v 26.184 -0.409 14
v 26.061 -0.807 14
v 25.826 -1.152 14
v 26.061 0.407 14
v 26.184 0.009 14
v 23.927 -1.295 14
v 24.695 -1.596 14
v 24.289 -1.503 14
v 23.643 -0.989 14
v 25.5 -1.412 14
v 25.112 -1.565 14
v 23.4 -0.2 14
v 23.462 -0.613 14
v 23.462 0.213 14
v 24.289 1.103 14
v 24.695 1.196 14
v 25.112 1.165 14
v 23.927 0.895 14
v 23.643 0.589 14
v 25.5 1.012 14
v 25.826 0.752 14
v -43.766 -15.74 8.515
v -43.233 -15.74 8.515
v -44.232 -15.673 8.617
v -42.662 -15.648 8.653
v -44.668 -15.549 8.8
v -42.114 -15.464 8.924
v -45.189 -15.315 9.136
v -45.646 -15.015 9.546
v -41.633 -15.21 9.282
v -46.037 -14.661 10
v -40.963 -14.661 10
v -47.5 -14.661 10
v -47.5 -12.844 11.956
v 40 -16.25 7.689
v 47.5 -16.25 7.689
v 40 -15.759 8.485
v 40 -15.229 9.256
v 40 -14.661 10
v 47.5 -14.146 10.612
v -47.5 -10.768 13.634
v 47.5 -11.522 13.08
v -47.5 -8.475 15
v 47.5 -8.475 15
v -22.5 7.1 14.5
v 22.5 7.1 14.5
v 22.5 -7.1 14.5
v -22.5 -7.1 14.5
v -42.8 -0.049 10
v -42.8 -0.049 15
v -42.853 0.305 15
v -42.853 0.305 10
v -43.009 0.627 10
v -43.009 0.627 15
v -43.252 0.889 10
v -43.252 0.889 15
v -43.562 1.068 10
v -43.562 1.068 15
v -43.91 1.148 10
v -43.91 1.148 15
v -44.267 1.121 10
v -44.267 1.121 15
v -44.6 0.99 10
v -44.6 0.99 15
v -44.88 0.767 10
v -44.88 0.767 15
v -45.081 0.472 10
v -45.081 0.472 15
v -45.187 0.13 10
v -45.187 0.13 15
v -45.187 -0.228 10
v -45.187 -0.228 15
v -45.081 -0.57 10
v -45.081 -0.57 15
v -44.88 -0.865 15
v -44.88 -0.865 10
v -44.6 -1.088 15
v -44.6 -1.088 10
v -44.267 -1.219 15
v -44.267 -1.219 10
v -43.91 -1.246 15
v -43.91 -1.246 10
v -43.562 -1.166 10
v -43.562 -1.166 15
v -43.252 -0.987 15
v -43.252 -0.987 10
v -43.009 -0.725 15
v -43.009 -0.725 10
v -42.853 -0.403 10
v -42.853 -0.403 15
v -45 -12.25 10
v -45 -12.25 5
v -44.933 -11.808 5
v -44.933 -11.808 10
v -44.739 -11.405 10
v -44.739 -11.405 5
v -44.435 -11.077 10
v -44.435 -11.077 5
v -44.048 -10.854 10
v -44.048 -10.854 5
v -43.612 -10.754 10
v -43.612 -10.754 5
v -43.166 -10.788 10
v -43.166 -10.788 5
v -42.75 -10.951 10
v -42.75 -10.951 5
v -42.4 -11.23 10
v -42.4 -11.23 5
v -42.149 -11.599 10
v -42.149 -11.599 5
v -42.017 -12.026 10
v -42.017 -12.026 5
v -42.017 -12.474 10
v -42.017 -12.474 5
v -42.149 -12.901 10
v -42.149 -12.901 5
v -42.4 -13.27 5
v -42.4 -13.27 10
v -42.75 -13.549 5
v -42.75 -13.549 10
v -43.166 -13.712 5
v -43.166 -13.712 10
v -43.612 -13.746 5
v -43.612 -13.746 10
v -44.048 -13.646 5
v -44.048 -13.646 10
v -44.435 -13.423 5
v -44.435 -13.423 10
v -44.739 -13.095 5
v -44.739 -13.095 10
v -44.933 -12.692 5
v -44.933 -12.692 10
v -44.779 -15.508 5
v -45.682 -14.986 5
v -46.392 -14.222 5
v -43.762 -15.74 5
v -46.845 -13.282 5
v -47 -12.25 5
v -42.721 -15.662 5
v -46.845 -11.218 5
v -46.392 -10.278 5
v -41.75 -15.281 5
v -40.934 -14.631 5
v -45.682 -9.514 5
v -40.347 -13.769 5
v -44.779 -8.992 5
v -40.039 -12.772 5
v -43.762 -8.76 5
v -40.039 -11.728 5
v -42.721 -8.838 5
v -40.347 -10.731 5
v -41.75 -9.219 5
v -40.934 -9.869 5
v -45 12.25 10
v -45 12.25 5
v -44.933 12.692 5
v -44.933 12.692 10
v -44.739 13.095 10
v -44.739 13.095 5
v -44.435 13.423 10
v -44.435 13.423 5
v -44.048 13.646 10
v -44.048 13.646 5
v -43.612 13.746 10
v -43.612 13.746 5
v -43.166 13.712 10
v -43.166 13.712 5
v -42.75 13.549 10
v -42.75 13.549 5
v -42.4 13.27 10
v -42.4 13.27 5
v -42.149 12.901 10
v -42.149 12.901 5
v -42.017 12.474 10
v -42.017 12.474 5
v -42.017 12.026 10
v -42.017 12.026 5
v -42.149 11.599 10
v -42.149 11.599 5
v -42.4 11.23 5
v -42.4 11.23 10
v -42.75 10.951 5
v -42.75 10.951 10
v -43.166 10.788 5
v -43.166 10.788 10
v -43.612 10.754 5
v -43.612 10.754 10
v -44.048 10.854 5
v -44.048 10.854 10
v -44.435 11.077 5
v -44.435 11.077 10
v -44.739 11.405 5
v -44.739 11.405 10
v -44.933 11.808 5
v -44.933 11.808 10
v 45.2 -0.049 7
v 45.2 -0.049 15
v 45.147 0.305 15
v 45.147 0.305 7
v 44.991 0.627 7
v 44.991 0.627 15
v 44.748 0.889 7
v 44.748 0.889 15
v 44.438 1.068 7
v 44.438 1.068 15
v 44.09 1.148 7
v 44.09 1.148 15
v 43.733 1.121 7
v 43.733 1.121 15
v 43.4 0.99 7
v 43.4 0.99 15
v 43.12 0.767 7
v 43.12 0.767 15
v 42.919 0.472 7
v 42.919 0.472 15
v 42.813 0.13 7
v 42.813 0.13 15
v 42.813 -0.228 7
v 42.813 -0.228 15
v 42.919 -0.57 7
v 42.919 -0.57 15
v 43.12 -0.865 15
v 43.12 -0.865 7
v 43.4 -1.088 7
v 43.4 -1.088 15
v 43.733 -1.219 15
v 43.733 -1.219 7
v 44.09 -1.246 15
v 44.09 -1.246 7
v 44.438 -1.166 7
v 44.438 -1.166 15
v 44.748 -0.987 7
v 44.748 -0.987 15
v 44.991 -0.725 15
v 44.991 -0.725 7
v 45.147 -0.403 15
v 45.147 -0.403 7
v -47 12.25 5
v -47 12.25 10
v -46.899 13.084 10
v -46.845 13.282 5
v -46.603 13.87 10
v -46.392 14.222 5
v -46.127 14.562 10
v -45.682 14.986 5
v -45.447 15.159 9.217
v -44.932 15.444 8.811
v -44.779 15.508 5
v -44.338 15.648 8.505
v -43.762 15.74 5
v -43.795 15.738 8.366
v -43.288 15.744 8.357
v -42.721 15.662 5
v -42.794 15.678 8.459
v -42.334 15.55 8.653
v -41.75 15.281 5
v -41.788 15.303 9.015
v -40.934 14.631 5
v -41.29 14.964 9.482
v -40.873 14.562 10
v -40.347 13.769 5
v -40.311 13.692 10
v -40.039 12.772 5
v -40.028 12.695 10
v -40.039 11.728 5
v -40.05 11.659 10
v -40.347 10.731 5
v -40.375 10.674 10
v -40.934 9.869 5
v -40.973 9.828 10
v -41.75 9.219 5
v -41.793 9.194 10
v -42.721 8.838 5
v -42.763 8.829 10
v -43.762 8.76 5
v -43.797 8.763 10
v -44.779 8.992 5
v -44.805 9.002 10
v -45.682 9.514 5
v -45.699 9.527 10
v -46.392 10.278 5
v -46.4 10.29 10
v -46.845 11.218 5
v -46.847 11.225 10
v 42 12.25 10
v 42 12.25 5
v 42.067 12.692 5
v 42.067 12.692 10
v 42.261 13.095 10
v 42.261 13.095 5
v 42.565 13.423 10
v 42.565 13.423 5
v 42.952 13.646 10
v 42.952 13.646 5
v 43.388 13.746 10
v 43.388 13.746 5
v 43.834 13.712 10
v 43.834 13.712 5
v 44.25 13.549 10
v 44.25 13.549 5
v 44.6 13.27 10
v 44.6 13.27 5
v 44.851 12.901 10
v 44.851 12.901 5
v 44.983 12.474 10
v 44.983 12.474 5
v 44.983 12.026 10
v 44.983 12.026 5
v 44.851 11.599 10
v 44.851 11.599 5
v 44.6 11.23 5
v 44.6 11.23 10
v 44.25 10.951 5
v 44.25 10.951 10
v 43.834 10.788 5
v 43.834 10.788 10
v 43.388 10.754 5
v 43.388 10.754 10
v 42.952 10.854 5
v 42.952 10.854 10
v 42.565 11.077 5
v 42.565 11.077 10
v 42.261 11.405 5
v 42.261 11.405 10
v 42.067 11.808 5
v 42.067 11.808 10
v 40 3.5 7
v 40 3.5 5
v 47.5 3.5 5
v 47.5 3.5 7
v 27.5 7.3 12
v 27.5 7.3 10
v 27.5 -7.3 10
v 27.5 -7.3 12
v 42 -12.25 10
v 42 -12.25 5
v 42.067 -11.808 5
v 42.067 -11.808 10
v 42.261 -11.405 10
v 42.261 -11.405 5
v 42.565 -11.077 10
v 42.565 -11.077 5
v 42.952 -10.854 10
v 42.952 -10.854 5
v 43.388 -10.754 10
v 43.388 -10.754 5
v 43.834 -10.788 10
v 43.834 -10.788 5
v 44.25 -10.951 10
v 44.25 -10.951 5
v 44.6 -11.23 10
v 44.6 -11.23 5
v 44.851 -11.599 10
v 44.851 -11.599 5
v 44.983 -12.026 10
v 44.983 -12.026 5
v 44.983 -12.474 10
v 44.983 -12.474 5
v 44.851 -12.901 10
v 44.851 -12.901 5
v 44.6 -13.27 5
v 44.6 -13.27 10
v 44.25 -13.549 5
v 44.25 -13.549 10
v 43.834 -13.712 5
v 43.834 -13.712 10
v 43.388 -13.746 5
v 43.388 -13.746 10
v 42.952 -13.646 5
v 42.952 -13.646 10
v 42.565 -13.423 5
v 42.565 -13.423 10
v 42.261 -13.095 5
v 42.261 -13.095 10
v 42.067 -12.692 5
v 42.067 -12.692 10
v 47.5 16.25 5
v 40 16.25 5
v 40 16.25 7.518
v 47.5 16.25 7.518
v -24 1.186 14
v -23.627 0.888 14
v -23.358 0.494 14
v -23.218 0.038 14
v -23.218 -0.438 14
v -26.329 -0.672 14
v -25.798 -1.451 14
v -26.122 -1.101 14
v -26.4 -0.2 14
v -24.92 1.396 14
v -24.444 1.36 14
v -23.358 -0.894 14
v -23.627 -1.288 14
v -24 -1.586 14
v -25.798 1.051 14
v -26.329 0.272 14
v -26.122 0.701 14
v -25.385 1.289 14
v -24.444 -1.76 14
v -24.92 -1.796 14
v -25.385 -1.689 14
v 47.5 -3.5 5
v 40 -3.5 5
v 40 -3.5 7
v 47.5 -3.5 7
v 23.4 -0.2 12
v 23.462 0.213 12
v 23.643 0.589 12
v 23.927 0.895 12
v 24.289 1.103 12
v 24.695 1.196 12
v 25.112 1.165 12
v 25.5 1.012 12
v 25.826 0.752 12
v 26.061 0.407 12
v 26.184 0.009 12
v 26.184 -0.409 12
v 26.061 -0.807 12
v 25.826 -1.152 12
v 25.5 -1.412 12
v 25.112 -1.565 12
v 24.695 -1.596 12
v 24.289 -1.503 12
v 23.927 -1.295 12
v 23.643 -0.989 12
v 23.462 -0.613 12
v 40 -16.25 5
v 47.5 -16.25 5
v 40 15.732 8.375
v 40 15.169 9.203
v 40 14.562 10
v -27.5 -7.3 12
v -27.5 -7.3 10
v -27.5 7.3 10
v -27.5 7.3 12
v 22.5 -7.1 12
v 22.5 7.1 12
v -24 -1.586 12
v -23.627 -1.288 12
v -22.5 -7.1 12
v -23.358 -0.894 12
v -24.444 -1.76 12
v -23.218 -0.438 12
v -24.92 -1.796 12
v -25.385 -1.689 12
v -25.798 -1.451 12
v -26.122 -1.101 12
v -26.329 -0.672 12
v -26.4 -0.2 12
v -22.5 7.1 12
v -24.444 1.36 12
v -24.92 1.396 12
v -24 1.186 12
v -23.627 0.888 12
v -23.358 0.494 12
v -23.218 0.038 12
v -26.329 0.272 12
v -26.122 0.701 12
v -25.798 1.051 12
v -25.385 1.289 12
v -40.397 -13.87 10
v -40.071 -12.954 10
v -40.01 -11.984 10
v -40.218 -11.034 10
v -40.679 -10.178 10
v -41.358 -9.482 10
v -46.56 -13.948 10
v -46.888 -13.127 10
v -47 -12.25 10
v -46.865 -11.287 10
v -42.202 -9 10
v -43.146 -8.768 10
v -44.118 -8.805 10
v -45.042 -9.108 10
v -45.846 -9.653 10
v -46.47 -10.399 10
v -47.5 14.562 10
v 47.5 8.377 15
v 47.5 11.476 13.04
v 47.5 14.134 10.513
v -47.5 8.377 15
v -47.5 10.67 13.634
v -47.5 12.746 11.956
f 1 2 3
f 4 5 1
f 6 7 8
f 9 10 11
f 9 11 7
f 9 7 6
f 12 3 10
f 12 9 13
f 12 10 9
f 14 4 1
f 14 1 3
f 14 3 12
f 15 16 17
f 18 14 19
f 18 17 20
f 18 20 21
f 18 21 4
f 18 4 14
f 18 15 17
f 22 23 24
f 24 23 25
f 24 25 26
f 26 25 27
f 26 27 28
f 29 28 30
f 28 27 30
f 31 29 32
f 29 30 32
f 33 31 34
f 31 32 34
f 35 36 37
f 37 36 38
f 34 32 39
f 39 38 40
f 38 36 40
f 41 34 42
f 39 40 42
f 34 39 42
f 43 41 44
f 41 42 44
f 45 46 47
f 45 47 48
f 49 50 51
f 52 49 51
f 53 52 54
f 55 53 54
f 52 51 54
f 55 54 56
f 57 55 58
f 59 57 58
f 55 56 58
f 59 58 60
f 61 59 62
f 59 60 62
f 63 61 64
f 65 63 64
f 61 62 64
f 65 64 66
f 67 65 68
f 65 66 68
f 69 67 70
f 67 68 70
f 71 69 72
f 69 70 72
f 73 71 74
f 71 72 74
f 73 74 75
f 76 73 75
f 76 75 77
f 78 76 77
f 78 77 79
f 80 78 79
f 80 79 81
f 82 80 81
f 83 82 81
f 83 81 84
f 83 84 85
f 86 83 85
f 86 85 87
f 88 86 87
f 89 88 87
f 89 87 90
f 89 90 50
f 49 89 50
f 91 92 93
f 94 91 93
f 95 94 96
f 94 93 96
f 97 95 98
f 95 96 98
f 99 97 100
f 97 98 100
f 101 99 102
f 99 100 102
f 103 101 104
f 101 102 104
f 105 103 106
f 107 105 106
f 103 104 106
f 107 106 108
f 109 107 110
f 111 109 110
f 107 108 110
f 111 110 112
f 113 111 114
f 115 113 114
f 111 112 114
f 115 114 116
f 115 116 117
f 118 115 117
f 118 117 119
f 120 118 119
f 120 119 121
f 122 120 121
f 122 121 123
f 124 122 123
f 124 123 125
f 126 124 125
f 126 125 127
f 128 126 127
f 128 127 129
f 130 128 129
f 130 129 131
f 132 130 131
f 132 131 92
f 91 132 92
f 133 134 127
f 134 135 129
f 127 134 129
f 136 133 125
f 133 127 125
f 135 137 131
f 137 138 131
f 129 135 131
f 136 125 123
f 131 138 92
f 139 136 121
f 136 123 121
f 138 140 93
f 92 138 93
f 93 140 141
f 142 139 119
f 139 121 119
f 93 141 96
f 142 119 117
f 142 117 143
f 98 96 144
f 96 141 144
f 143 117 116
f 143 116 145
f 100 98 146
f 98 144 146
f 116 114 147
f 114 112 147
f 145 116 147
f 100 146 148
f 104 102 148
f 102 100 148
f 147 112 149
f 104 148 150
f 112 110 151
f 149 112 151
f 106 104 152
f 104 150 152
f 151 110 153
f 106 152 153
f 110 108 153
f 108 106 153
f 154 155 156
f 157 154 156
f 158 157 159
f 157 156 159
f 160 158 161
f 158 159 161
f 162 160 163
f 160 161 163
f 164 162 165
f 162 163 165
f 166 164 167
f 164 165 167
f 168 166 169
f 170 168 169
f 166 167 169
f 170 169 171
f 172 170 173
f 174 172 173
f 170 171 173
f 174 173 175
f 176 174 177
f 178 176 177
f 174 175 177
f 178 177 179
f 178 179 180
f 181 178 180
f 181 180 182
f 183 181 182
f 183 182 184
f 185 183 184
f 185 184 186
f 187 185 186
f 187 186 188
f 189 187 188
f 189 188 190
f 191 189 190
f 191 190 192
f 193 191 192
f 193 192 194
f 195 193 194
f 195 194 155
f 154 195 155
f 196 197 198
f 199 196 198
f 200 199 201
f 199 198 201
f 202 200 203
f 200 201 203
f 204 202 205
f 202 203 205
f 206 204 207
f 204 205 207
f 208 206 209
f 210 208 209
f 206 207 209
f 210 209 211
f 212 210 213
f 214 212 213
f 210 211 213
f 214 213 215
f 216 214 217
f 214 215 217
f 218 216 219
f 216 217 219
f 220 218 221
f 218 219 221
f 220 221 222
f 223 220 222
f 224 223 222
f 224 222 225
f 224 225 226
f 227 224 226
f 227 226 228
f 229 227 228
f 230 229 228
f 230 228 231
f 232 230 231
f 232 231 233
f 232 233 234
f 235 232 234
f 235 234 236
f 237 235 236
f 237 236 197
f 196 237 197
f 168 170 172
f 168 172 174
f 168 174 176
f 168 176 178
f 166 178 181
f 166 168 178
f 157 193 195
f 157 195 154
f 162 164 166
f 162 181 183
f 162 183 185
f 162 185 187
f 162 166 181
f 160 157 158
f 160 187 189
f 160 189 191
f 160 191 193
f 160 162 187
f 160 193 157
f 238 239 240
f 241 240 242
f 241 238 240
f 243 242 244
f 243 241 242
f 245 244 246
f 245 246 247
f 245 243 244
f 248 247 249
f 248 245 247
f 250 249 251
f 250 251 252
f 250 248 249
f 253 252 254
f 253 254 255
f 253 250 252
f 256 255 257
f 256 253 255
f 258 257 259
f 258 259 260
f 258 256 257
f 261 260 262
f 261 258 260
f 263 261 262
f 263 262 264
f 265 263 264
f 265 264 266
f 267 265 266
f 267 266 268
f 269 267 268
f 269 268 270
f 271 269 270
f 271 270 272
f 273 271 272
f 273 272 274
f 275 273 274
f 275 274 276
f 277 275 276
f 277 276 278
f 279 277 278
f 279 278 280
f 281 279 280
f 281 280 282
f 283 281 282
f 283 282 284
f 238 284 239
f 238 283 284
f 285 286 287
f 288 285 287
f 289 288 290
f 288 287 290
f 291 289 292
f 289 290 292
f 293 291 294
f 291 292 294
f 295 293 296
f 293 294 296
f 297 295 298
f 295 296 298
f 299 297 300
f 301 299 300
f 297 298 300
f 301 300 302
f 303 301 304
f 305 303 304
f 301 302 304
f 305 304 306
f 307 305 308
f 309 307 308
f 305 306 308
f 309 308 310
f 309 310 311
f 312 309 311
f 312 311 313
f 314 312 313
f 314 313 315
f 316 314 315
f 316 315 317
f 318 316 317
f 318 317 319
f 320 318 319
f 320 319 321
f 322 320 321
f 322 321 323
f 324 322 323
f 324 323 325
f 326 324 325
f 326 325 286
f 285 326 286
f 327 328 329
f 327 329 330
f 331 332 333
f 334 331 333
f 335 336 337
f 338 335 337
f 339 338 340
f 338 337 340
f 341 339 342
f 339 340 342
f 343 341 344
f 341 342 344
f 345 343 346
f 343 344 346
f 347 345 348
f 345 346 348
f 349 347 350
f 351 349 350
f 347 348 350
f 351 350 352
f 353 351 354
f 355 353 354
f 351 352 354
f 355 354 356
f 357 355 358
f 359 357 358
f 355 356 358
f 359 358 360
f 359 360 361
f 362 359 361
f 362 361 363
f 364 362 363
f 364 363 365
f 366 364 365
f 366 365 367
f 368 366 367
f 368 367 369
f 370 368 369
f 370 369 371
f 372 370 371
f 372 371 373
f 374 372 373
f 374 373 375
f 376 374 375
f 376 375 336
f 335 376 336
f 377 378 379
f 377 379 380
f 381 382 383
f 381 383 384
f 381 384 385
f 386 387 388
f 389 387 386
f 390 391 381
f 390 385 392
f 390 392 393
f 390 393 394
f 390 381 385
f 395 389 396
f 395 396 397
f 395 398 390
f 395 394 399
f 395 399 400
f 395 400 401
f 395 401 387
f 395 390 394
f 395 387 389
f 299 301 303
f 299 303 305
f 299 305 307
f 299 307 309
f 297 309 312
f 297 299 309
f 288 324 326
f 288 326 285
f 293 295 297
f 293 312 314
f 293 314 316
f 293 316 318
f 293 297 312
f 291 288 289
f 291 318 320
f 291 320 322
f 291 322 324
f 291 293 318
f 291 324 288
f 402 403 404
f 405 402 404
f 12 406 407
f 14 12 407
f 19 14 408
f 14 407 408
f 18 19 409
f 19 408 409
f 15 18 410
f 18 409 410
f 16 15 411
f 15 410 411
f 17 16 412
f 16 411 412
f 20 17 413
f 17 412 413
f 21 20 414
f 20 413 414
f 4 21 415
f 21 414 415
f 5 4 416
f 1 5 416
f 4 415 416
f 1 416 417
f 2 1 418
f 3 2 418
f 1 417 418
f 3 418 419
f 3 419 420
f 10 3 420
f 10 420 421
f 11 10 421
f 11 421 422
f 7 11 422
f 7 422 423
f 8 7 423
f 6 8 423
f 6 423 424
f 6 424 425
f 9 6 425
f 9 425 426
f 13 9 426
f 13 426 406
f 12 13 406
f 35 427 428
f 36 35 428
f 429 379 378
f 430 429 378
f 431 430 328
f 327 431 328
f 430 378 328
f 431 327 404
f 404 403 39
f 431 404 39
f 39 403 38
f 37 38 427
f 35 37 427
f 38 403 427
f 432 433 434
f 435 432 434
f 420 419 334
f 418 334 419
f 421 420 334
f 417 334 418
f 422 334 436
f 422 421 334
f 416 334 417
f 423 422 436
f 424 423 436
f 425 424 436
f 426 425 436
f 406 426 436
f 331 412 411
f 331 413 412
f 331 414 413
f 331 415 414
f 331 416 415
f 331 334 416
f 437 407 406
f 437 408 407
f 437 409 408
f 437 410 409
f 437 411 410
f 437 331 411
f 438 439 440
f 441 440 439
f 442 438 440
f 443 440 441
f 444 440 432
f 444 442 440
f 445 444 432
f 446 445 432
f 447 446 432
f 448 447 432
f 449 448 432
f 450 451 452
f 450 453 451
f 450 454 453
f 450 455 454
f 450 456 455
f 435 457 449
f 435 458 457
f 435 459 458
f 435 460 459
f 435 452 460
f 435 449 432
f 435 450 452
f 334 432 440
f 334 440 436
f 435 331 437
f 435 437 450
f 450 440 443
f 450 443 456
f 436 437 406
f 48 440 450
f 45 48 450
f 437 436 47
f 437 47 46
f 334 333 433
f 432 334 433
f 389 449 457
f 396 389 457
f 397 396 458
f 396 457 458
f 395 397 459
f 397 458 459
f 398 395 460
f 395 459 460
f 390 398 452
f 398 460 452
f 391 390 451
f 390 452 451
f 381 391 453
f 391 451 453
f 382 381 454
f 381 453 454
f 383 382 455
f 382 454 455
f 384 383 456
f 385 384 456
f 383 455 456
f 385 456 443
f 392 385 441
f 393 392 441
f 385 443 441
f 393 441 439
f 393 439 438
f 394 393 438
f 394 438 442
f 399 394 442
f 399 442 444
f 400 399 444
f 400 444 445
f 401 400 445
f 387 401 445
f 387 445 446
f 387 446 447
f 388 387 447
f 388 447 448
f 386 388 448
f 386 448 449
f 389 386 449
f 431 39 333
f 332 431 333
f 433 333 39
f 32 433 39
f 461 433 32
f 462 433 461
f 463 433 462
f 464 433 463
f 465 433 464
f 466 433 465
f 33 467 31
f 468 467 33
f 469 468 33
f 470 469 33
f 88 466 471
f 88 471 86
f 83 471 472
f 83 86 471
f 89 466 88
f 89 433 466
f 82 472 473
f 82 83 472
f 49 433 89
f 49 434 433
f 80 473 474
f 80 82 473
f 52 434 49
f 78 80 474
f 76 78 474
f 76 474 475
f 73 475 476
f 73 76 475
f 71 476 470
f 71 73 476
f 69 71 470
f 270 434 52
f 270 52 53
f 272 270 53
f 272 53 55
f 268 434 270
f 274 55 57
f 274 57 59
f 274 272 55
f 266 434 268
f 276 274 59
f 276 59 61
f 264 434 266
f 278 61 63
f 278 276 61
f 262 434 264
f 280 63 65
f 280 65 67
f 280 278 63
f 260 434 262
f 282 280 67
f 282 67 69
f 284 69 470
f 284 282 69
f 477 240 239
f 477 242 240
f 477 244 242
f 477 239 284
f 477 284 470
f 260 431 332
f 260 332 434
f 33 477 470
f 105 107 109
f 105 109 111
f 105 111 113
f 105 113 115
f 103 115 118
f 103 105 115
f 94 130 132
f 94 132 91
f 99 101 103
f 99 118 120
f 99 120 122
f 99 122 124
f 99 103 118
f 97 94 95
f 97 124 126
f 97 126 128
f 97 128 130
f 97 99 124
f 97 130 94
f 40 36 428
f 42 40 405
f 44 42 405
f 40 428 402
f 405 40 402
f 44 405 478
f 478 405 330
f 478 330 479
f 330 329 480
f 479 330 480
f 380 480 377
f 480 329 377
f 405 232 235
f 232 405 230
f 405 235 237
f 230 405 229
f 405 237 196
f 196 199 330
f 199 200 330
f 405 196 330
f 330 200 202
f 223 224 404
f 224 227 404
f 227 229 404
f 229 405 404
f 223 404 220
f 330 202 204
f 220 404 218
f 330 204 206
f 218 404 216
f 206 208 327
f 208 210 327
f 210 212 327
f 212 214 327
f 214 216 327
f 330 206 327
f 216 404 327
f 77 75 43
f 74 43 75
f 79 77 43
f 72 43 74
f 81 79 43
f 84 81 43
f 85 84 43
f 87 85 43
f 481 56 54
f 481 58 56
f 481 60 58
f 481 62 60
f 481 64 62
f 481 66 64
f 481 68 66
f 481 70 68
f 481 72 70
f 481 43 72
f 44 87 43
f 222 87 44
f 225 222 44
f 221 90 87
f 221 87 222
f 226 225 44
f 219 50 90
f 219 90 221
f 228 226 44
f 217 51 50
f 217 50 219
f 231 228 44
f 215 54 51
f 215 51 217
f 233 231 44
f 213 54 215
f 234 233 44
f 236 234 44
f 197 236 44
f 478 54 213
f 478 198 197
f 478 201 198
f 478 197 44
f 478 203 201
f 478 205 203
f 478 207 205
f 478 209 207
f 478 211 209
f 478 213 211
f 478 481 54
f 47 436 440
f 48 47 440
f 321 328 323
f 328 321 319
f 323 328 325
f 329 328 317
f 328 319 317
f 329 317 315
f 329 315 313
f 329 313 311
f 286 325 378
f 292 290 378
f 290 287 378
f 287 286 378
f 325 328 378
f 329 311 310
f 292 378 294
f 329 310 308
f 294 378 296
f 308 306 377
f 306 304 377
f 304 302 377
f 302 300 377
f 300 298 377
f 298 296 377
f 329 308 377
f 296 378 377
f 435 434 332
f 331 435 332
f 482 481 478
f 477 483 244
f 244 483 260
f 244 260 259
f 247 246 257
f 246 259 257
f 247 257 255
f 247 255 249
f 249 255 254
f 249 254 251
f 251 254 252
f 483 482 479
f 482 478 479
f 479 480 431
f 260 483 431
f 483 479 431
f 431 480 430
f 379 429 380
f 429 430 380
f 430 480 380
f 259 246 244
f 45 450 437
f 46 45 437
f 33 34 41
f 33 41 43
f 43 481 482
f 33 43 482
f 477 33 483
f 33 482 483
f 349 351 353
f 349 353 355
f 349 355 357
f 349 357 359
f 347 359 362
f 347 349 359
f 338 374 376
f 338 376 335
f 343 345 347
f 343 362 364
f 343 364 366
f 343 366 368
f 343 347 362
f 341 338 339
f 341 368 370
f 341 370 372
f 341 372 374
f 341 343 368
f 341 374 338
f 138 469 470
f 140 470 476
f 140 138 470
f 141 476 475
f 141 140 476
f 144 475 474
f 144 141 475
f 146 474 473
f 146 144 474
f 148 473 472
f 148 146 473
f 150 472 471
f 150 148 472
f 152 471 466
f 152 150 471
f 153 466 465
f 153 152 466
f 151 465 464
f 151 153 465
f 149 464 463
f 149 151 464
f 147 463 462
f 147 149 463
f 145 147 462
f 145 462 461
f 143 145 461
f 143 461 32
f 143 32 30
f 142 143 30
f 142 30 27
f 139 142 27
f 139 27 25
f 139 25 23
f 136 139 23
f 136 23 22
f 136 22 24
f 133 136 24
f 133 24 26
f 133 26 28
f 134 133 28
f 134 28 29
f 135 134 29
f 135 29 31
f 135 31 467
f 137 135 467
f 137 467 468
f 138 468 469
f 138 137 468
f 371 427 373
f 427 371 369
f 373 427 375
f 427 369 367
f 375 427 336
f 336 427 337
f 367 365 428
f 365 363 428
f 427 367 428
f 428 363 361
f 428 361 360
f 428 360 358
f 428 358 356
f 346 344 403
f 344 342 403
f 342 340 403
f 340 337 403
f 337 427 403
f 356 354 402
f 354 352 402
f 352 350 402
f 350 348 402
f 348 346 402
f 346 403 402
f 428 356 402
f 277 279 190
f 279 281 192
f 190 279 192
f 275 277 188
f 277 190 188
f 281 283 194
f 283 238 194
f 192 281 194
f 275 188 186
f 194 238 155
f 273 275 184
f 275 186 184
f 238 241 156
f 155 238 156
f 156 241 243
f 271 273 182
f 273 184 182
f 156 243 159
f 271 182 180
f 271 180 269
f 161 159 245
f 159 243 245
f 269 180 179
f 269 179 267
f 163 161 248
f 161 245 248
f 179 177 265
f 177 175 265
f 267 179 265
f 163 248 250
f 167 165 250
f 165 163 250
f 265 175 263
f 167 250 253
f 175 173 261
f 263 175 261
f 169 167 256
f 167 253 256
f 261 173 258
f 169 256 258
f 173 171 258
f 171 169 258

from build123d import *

# Parameters (mm, degrees)
SKETCH1_R             = 4
SKETCH1_R_2           = 1.5
BOSS_EXTRUDE1_DEPTH   = 5
BOSS_EXTRUDE1_2_DEPTH = 5
BOSS_EXTRUDE1_3_DEPTH = 5
BOSS_EXTRUDE1_4_DEPTH = 5
SKETCH2_W             = 95
SKETCH2_H             = 32.5
BOSS_EXTRUDE2_DEPTH   = 10
SKETCH3_W             = 45
SKETCH3_H             = 14.2
CUT_EXTRUDE1_DEPTH    = 9
SKETCH4_W             = 5
SKETCH4_H             = 14.2
SKETCH4_W_2           = 45
CUT_EXTRUDE2_DEPTH    = 4
SKETCH5_R             = 1.4
SKETCH5_R_2           = 1.6
CUT_EXTRUDE3_DEPTH    = 5
BOSS_EXTRUDE3_DEPTH   = 5
CUT_EXTRUDE5_DEPTH    = 96
SKETCH9_W             = 7
SKETCH9_H             = 7
CUT_EXTRUDE6_DEPTH    = 96
SKETCH10_R            = 1.2
CUT_EXTRUDE7_DEPTH    = 16
SKETCH12_R            = 1.5
CUT_EXTRUDE9_DEPTH    = 10
SKETCH13_W            = 95
SKETCH13_H            = 32.5
CUT_EXTRUDE10_DEPTH   = 5
SKETCH14_R            = 3.5
CUT_EXTRUDE11_DEPTH   = 5
SKETCH15_W            = 45
SKETCH15_H            = 14.2
CUT_EXTRUDE12_DEPTH   = 0.5
SKETCH16_R            = 1.4
SKETCH16_R_2          = 1.6
SKETCH16_W            = 45
SKETCH16_H            = 14.2
CUT_EXTRUDE13_DEPTH   = 2


with BuildPart() as part:
    # Sketch1 → Boss-Extrude1 (new body)
    with BuildSketch(Plane.XY):
        with Locations((-43.5, -12.25)):
            Circle(SKETCH1_R)
        with Locations((-43.5, -12.25)):
            Circle(SKETCH1_R_2, mode=Mode.SUBTRACT)
    extrude(amount=BOSS_EXTRUDE1_DEPTH)



with BuildPart() as body_2:
    # Sketch1 → Boss-Extrude1 2 (new body)
    with BuildSketch(Plane.XY):
        with Locations((-43.5, 12.25)):
            Circle(SKETCH1_R)
        with Locations((-43.5, 12.25)):
            Circle(SKETCH1_R_2, mode=Mode.SUBTRACT)
    extrude(amount=BOSS_EXTRUDE1_2_DEPTH)


with BuildPart() as body_3:
    # Sketch1 → Boss-Extrude1 3 (new body)
    with BuildSketch(Plane.XY):
        with Locations((43.5, -12.25)):
            Circle(SKETCH1_R)
        with Locations((43.5, -12.25)):
            Circle(SKETCH1_R_2, mode=Mode.SUBTRACT)
    extrude(amount=BOSS_EXTRUDE1_3_DEPTH)


with BuildPart() as body_4:
    # Sketch1 → Boss-Extrude1 4 (new body)
    with BuildSketch(Plane.XY):
        with Locations((43.5, 12.25)):
            Circle(SKETCH1_R)
        with Locations((43.5, 12.25)):
            Circle(SKETCH1_R_2, mode=Mode.SUBTRACT)
    extrude(amount=BOSS_EXTRUDE1_4_DEPTH)


with BuildPart() as part_1:
    add(part.part)

    add(body_2.part)  # Boss-Extrude2 merges body 2

    add(body_3.part)  # Boss-Extrude2 merges body 3

    add(body_4.part)  # Boss-Extrude2 merges body 4
    # Sketch2 → Boss-Extrude2 (add)
    with BuildSketch(Plane.XY.offset(5)):
        Rectangle(SKETCH2_W, SKETCH2_H)
    extrude(amount=BOSS_EXTRUDE2_DEPTH)

    # Sketch3 → Cut-Extrude1 (cut)
    with BuildSketch(Plane(origin=(0, 0, 5), x_dir=(-1, 0, 0), z_dir=(0, 0, -1))):
        Rectangle(SKETCH3_W, SKETCH3_H)
    extrude(amount=-CUT_EXTRUDE1_DEPTH, mode=Mode.SUBTRACT)

    # Sketch4 → Cut-Extrude2 (cut)
    with BuildSketch(Plane(origin=(0, 0, 5), x_dir=(-1, 0, 0), z_dir=(0, 0, -1))):
        with Locations((-25, 0)):
            Rectangle(SKETCH4_W, SKETCH4_H)
        Rectangle(SKETCH4_W_2, SKETCH4_H)
        with Locations((25, 0)):
            Rectangle(SKETCH4_W, SKETCH4_H)
    extrude(amount=-CUT_EXTRUDE2_DEPTH, mode=Mode.SUBTRACT)

    # Sketch5 → Cut-Extrude3 (cut)
    with BuildSketch(Plane(origin=(0, 0, 9), x_dir=(-1, 0, 0), z_dir=(0, 0, -1))):
        with Locations((-24.8, -0.2)):
            Circle(SKETCH5_R)
        with Locations((24.8, -0.2)):
            Circle(SKETCH5_R_2)
    extrude(amount=-CUT_EXTRUDE3_DEPTH, mode=Mode.SUBTRACT)

    # Sketch6 → Boss-Extrude3 (add)
    with BuildSketch(Plane(origin=(0, 0, 5), x_dir=(-1, 0, 0), z_dir=(0, 0, -1))):
        with BuildLine():
            ThreePointArc((47.5, 12.25), (43.5, 8.25), (39.5, 12.25))
            Line((39.5, 12.25), (39.5, -12.25))
            ThreePointArc((39.5, -12.25), (43.5, -8.25), (47.5, -12.25))
            Line((47.5, -12.25), (47.5, 12.25))
        make_face()
        with BuildLine():
            ThreePointArc((-39.5, 12.25), (-43.5, 8.25), (-47.5, 12.25))
            Line((-47.5, 12.25), (-47.5, -12.25))
            ThreePointArc((-47.5, -12.25), (-43.5, -8.25), (-39.5, -12.25))
            Line((-39.5, -12.25), (-39.5, 12.25))
        make_face()
    extrude(amount=BOSS_EXTRUDE3_DEPTH)

    # Sketch8 → Cut-Extrude5 (cut, through all)
    with BuildSketch(Plane(origin=(47.5, 0, 0), x_dir=(0, 0, -1), z_dir=(1, 0, 0))):
        with BuildLine():
            ThreePointArc((-15, 8.377014021), (-11.841659381, 12.867099577), (-7.518238456, 16.25))
            Line((-7.518238456, 16.25), (-15, 16.25))
            Line((-15, 16.25), (-15, 8.377014021))
        make_face()
        with BuildLine():
            Line((-15, -16.25), (-7.688934819, -16.25))
            ThreePointArc((-7.688934819, -16.25), (-11.909309532, -12.893789895), (-15, -8.475267356))
            Line((-15, -8.475267356), (-15, -16.25))
        make_face()
    extrude(amount=-CUT_EXTRUDE5_DEPTH, mode=Mode.SUBTRACT)

    # Sketch9 → Cut-Extrude6 (cut, through all)
    with BuildSketch(Plane.ZY.offset(47.5)):
        with Locations((3.5, 0)):
            Rectangle(SKETCH9_W, SKETCH9_H)
    extrude(amount=-CUT_EXTRUDE6_DEPTH, mode=Mode.SUBTRACT)

    # Sketch10 → Cut-Extrude7 (cut, through all)
    with BuildSketch(Plane.XY.offset(15)):
        with Locations((-44, -0.049126667)):
            Circle(SKETCH10_R)
        with Locations((44, -0.049126667)):
            Circle(SKETCH10_R)
    extrude(amount=-CUT_EXTRUDE7_DEPTH, mode=Mode.SUBTRACT)

    # Sketch12 → Cut-Extrude9 (cut)
    with BuildSketch(Plane(origin=(0, 0, 0), x_dir=(-1, 0, 0), z_dir=(0, 0, -1))):
        with Locations((-43.5, 12.25)):
            Circle(SKETCH12_R)
        with Locations((-43.5, -12.25)):
            Circle(SKETCH12_R)
        with Locations((43.5, 12.25)):
            Circle(SKETCH12_R)
        with Locations((43.5, -12.25)):
            Circle(SKETCH12_R)
    extrude(amount=-CUT_EXTRUDE9_DEPTH, mode=Mode.SUBTRACT)

    # Sketch13 → Cut-Extrude10 (cut)
    with BuildSketch(Plane(origin=(0, 0, 0), x_dir=(-1, 0, 0), z_dir=(0, 0, -1))):
        Rectangle(SKETCH13_W, SKETCH13_H)
    extrude(amount=-CUT_EXTRUDE10_DEPTH, mode=Mode.SUBTRACT)

    # Sketch14 → Cut-Extrude11 (cut)
    with BuildSketch(Plane(origin=(0, 0, 5), x_dir=(-1, 0, 0), z_dir=(0, 0, -1))):
        Polygon((-40, 16.25), (-40, -3.5), (-27.5, -3.5), (-27.5, -7.1), (27.5, -7.1), (27.5, -3.5), (47.5, -3.5), (47.5, 16.25), align=None)
        with Locations((43.5, 12.25)):
            Circle(SKETCH14_R, mode=Mode.SUBTRACT)
        Polygon((-40, -3.5), (-40, -12.25), (-40, -16.25), (47.5, -16.25), (47.5, -3.5), (27.5, -3.5), (27.5, -7.1), (-27.5, -7.1), (-27.5, -3.5), align=None)
        with Locations((43.5, -12.25)):
            Circle(SKETCH14_R, mode=Mode.SUBTRACT)
    extrude(amount=-CUT_EXTRUDE11_DEPTH, mode=Mode.SUBTRACT)

    # Sketch15 → Cut-Extrude12 (cut)
    with BuildSketch(Plane(origin=(0, 0, 14), x_dir=(-1, 0, 0), z_dir=(0, 0, -1))):
        Rectangle(SKETCH15_W, SKETCH15_H)
    extrude(amount=-CUT_EXTRUDE12_DEPTH, mode=Mode.SUBTRACT)

    # Sketch16 → Cut-Extrude13 (cut)
    with BuildSketch(Plane(origin=(0, 0, 10), x_dir=(-1, 0, 0), z_dir=(0, 0, -1))):
        Polygon((-27.5, 7.3), (-27.5, 7.1), (-27.5, -7.3), (27.5, -7.3), (27.5, -7.1), (27.5, 7.3), align=None)
        with Locations((-24.8, -0.2)):
            Circle(SKETCH16_R, mode=Mode.SUBTRACT)
        with Locations((24.8, -0.2)):
            Circle(SKETCH16_R_2, mode=Mode.SUBTRACT)
        Rectangle(SKETCH16_W, SKETCH16_H, mode=Mode.SUBTRACT)
        Rectangle(SKETCH16_W, SKETCH16_H)
    extrude(amount=-CUT_EXTRUDE13_DEPTH, mode=Mode.SUBTRACT)


solid = part_1.part
